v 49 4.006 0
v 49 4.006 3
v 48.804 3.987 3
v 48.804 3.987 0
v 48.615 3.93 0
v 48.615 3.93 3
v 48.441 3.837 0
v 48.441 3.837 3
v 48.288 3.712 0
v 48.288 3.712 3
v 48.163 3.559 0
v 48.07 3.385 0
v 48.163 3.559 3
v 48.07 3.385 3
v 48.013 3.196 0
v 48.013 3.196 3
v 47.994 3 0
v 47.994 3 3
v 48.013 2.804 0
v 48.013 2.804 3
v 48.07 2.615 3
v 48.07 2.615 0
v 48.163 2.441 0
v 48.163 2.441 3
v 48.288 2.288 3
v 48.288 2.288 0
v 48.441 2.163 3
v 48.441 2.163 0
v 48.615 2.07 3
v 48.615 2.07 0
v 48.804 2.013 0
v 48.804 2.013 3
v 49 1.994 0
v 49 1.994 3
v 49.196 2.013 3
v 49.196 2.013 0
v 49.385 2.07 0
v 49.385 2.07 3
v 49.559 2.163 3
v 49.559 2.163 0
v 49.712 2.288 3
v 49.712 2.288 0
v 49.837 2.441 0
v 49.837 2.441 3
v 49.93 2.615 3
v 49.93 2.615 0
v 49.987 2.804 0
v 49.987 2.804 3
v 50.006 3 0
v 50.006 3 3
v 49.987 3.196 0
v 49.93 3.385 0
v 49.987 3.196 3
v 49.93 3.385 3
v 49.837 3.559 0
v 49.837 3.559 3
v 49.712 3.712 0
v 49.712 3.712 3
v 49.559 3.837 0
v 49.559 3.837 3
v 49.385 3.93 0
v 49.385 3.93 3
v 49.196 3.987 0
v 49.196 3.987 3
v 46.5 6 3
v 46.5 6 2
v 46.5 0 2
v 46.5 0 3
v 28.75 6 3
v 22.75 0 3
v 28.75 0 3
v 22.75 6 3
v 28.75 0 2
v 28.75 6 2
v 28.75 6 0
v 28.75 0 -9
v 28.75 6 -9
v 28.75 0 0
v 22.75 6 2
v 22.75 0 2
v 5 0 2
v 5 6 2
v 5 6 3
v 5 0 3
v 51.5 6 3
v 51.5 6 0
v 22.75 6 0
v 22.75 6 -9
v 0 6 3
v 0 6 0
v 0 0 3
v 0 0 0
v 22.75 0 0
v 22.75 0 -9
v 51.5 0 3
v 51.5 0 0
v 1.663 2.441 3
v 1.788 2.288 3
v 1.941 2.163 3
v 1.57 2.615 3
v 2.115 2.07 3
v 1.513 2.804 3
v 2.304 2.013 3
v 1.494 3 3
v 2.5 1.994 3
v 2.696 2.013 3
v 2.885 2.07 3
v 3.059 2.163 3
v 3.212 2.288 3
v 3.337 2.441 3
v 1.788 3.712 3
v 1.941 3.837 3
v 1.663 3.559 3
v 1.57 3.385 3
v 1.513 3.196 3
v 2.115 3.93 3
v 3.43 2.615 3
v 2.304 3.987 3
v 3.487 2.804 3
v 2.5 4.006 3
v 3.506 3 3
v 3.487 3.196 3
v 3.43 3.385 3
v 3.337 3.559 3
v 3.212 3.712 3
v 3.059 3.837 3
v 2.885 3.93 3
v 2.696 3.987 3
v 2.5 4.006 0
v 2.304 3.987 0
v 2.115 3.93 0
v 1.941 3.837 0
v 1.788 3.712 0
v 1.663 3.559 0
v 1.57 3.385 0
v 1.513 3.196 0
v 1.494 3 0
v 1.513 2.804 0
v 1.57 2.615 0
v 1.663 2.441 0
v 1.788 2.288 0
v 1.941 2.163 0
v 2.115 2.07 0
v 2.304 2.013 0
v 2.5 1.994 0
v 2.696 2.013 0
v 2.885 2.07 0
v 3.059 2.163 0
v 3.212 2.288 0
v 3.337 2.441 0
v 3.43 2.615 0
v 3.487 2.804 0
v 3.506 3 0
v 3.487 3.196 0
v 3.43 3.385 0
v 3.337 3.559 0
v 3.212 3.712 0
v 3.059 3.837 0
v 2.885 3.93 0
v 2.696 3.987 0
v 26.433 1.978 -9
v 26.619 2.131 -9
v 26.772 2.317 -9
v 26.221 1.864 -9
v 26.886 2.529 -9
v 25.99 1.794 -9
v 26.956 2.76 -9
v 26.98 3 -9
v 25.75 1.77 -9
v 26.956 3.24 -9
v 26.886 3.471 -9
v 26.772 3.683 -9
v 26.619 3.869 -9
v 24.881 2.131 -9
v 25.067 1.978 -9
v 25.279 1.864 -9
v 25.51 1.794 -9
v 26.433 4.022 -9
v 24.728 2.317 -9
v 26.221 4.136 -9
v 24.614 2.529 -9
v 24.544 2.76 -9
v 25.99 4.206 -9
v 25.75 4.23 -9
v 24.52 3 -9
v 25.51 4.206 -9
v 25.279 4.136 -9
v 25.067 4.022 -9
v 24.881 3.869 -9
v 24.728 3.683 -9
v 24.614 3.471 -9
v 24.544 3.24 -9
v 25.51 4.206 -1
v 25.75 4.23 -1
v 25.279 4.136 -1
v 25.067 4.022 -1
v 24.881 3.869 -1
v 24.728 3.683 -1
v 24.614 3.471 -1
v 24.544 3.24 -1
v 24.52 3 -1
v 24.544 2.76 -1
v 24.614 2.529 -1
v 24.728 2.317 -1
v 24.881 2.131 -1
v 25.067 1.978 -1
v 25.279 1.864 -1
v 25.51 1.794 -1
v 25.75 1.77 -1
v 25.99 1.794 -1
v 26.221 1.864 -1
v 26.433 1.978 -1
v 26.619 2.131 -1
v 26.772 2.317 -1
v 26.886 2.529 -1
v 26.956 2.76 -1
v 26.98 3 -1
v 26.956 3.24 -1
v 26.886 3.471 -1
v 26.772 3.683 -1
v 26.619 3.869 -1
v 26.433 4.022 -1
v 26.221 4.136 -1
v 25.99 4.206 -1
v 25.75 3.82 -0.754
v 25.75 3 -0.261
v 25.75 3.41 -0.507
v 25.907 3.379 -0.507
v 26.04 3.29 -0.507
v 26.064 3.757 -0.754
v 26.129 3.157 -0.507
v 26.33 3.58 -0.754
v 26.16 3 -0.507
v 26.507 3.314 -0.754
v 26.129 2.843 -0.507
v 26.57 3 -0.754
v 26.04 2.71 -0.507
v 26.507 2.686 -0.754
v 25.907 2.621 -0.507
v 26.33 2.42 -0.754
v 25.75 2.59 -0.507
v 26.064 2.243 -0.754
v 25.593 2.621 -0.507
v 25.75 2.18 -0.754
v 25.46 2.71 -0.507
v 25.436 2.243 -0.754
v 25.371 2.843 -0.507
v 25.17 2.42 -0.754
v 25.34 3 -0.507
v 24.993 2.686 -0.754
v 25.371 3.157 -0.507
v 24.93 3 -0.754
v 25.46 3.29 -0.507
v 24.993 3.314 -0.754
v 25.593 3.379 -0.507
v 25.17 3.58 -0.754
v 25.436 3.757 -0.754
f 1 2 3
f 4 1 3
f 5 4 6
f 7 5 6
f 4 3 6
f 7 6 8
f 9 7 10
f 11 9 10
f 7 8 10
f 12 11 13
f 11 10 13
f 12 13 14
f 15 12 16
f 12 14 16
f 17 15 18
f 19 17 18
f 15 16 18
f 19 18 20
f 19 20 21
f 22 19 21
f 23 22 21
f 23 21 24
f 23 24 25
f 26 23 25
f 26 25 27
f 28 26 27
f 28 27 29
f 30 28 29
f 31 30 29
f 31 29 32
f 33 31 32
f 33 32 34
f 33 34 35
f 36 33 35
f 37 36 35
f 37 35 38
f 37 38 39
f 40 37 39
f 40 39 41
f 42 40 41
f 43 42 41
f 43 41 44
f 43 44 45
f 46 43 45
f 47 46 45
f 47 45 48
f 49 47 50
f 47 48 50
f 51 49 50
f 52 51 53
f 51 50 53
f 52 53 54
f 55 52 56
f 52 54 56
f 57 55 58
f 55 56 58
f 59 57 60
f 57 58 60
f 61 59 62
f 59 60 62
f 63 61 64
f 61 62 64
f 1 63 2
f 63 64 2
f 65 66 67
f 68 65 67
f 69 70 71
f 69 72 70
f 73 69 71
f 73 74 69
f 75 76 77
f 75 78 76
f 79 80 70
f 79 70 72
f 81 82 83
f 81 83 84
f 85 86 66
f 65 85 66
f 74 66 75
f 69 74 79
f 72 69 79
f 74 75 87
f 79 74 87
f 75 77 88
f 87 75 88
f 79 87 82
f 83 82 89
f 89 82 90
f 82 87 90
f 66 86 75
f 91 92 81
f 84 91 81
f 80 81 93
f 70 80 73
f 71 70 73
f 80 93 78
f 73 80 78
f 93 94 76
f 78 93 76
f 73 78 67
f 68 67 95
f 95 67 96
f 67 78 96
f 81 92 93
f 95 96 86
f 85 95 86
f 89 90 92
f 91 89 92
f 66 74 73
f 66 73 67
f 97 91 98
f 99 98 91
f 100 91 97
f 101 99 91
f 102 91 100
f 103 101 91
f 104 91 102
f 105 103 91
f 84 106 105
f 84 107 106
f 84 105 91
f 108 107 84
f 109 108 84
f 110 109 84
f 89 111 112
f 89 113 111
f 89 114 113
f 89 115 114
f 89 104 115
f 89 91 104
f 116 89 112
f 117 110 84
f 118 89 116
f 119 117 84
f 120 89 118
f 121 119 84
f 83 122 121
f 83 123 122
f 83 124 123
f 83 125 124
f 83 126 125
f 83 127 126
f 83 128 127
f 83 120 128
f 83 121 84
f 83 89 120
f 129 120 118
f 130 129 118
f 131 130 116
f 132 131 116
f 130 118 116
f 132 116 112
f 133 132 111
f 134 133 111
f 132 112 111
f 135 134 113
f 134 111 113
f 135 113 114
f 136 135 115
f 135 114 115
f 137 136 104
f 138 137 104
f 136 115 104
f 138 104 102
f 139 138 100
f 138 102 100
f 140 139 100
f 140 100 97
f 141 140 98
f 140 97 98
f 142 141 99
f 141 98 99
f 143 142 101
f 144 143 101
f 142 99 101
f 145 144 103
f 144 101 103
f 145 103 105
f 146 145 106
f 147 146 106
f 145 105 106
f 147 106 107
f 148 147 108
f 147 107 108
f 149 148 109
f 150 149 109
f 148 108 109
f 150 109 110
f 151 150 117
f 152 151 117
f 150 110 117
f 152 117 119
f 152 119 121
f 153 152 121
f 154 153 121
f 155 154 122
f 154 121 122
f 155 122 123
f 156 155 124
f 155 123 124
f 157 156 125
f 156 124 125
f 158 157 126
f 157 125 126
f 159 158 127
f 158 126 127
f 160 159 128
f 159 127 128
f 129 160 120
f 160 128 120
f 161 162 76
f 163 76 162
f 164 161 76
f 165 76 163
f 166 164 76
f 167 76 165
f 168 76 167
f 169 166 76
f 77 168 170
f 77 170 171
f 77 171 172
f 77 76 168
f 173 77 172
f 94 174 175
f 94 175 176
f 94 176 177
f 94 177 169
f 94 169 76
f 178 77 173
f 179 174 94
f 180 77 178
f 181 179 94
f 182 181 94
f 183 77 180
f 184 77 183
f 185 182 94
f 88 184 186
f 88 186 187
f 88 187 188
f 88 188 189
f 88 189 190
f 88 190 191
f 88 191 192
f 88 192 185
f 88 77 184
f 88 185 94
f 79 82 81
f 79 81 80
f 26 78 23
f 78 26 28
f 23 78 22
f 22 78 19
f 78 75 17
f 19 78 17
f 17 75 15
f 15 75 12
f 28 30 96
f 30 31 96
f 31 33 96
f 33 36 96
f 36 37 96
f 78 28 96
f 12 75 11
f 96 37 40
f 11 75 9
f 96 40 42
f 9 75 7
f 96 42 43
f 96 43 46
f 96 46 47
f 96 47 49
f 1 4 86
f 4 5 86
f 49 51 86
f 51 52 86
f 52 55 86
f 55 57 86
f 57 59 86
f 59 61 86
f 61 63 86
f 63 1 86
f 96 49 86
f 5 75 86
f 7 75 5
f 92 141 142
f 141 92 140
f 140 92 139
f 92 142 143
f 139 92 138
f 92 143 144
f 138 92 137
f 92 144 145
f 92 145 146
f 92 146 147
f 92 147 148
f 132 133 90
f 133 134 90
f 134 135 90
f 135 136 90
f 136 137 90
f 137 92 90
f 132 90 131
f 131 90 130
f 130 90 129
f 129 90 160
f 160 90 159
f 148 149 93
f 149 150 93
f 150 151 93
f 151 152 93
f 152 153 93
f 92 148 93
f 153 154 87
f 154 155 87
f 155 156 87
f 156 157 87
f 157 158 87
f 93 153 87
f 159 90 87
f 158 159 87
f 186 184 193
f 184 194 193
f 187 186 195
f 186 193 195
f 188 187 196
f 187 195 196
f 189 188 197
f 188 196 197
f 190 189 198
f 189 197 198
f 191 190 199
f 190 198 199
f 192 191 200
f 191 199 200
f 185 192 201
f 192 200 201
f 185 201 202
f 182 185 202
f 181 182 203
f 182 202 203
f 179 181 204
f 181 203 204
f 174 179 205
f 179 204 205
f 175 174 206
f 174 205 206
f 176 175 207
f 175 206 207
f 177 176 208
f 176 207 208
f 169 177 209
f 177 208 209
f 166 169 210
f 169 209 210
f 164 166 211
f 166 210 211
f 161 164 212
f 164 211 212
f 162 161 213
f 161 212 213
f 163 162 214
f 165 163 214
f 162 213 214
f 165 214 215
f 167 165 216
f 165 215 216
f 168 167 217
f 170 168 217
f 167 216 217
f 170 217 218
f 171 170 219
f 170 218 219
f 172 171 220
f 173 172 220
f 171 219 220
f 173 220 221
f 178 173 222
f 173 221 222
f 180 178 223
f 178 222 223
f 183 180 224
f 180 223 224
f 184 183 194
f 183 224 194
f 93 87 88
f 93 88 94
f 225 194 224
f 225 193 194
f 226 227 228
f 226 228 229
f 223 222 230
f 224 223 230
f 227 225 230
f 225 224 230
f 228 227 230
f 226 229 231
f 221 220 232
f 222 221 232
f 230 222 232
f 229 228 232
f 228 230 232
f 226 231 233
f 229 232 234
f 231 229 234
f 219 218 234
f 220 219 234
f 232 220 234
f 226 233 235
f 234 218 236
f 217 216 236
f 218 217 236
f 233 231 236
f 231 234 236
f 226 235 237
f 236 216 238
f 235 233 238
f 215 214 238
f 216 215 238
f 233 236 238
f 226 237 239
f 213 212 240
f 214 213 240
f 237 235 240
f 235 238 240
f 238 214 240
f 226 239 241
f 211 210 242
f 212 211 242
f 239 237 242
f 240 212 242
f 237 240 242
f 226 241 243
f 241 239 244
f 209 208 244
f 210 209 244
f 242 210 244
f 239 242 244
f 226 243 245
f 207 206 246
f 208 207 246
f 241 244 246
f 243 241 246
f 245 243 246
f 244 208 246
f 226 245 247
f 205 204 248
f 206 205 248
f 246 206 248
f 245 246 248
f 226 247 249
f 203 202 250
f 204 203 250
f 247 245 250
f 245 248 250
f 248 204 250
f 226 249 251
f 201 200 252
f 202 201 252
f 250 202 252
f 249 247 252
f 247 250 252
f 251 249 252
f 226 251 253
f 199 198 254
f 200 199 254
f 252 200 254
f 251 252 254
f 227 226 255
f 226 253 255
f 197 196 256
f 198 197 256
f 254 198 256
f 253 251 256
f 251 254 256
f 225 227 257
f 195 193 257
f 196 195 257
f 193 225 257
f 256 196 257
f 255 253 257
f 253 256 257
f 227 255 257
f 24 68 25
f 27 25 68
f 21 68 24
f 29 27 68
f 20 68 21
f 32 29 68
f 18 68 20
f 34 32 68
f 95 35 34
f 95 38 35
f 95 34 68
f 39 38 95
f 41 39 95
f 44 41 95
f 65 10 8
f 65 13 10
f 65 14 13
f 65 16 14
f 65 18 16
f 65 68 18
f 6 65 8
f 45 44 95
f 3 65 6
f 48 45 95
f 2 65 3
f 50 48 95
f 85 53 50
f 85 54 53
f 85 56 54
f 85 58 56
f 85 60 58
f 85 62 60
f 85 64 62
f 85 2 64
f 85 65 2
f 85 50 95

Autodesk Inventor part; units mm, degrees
ref_plane "YZ Plane" through (0, 0, 0) normal (1, 0, 0) x (0, 1, 0)
ref_plane "XZ Plane" through (0, 0, 0) normal (0, 1, 0) x (-1, 0, 0)
ref_plane "XY Plane" through (0, 0, 0) normal (0, 0, 1) x (1, 0, 0)
sketch "Sketch1" plane through (0, 0, 0) normal (0, 0, 1) x (1, 0, 0)
  line L0 (0, 0) -> (51.5, 0)
  line L1 (51.5, 0) -> (51.5, 6)
  line L2 (51.5, 6) -> (0, 6)
  line L3 (0, 6) -> (0, 0)
  dimension "d0" = 6
  dimension "d1" = 51.5
extrude "Extrusion1" add sketch "Sketch1" along normal blind 2
sketch "Sketch2" plane through (0, 0, 2) normal (0, 0, 1) x (1, 0, 0)
  line L0 (0, 0) -> (51.5, 0) projected
  line L1 (51.5, 0) -> (51.5, 6) projected
  line L2 (51.5, 6) -> (0, 6) projected
  line L3 (0, 6) -> (0, 0) projected
  line L4 (0, 6) -> (5, 6)
  line L5 (5, 6) -> (5, 0)
  line L6 (5, 0) -> (0, 0)
  line L7 (0, 0) -> (0, 6)
  line L8 (22.75, 6) -> (28.75, 6)
  line L9 (28.75, 6) -> (28.75, 0)
  line L10 (28.75, 0) -> (22.75, 0)
  line L11 (22.75, 0) -> (22.75, 6)
  line L12 (51.5, 6) -> (46.5, 6)
  line L13 (46.5, 6) -> (46.5, 0)
  line L14 (46.5, 0) -> (51.5, 0)
  line L15 (51.5, 0) -> (51.5, 6)
  dimension "d4" = 5
  dimension "d5" = 5
  dimension "d7" = 17.75
  dimension "d8" = 17.75
  dimension "d41" = 6
extrude "Extrusion2" add sketch "Sketch2" along normal blind 1 contours L3 L2 L5 L0 | L11 L2 L9 L0 | L13 L2 L1 L0
sketch "Sketch5" plane through (0, 0, 0) normal (0, 0, -1) x (-1, 0, 0)
  line L0 (0, 0) -> (-51.5, 0) projected
  line L1 (0, 6) -> (0, 0) projected
  line L2 (-51.5, 6) -> (0, 6) projected
  line L3 (-51.5, 0) -> (-51.5, 6) projected
  line L4 (-25.75, 6) -> (-25.75, 0) construction
  line L5 (-51.5, 3) -> (0, 3) construction
  line L6 (-28.75, 6) -> (-22.75, 6)
  line L7 (-22.75, 6) -> (-22.75, 0)
  line L8 (-22.75, 0) -> (-28.75, 0)
  line L9 (-28.75, 0) -> (-28.75, 6)
  line L10 (-28.75, 6) -> (-22.75, 0) construction
  line L11 (-22.75, 6) -> (-28.75, 0) construction
  point P0 (-25.75, 3)
  dimension "d19" = 6
extrude "Extrusion3" add sketch "Sketch5" along normal blind 9 contours L0 L9 L2 L7
sketch "Sketch6" plane through (0, 0, -9) normal (0, 0, -1) x (-1, 0, 0)
  line L0 (-22.75, 0) -> (-22.75, 6) projected
  line L1 (-22.75, 6) -> (-28.75, 6) projected
  line L2 (-28.75, 6) -> (-28.75, 0) projected
  line L3 (-28.75, 0) -> (-22.75, 0) projected
  line L4 (-28.75, 3) -> (-22.75, 3) construction
  line L5 (-25.75, 6) -> (-25.75, 0) construction
  point P0 (0, 0)
  point P1 (-25.75, 3)
hole "Hole2" at (25.75, 3, -9) direction (0, 0, 1) diameter 2.459 depth 8 tip angle 118 thread size "M3x0.5" class "6H" standard "ISO Metric profile"
sketch "Sketch7" plane through (0, 0, 0) normal (0, 0, -1) x (-1, 0, 0)
  line L0 (0, 6) -> (0, 0) projected
  line L1 (0, 0) -> (-22.75, 0) projected
  line L2 (0, 6) -> (0, 0) projected
  line L3 (-51.5, 0) -> (-51.5, 6) projected
  line L4 (-51.5, 6) -> (-28.75, 6) projected
  line L5 (-51.5, 3) -> (0, 3) construction
  line L6 (-22.75, 6) -> (-22.75, 0) projected
  line L7 (-28.75, 6) -> (-22.75, 6) projected
  line L8 (-28.75, 0) -> (-28.75, 6) projected
  line L9 (-28.75, 0) -> (-51.5, 0) projected
  line L10 (-22.75, 6) -> (0, 6) projected
  line L11 (-22.75, 0) -> (-28.75, 0) projected
  point P0 (-49, 3)
  point P1 (-2.5, 3)
  dimension "d31" = 2.5
  dimension "d32" = 2.5
hole "Hole3" at (49, 3, 0) at (2.5, 3, 0) direction (0, 0, 1) diameter 2.013 depth 3 tip angle 118 thread size "M2.5x0.45" class "6H" standard "ISO Metric profile"
properties part number "top_conductor" material "Copper, Alloy"
